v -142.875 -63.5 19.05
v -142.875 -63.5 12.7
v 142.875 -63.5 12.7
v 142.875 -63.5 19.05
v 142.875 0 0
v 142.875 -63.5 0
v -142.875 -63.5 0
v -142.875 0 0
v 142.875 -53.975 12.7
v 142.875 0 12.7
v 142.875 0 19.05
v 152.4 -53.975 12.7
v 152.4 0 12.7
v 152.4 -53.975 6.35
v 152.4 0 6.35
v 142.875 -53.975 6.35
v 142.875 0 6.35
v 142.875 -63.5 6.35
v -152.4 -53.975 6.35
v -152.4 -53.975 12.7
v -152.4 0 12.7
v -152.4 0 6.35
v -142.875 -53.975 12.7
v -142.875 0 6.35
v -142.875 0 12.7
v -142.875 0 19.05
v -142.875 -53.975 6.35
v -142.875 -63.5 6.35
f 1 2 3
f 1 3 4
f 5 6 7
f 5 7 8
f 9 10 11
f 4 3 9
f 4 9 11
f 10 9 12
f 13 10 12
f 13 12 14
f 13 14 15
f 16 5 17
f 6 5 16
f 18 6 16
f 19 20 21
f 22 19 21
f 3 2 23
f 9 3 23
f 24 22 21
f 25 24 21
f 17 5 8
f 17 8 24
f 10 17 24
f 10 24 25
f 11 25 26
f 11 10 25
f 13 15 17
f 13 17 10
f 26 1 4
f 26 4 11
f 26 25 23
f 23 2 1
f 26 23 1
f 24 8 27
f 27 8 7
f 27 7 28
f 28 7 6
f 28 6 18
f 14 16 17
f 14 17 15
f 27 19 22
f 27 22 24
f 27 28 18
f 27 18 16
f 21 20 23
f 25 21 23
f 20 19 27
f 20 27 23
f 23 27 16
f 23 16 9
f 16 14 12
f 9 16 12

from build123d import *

# Parameters (mm, degrees)
F0_W     = 63.5
F0_H     = 19.05
F1_DEPTH = 152.4
F2_W     = 9.525
F2_H     = 6.35
F3_DEPTH = 63.501
F4_W     = 9.525
F4_H     = 6.35
F5_DEPTH = 304.801


with BuildPart() as f1:
    # F0 (on Right) → F1 (new body, symmetric)
    with BuildSketch(Plane.YZ):
        with Locations((-31.75, 9.525)):
            Rectangle(F0_W, F0_H)
    extrude(amount=F1_DEPTH, both=True)

    # F2 (on face) → F3 (cut, through all)
    with BuildSketch(Plane.XZ.offset(63.5)):
        with Locations((147.6375, 15.875)):
            Rectangle(F2_W, F2_H)
        with Locations((147.6375, 3.175)):
            Rectangle(F2_W, F2_H)
        with Locations((-147.6375, 15.875)):
            Rectangle(F2_W, F2_H)
        with Locations((-147.6375, 3.175)):
            Rectangle(F2_W, F2_H)
    extrude(amount=-F3_DEPTH, mode=Mode.SUBTRACT)

    # F4 (on face) → F5 (cut, through all)
    with BuildSketch(Plane.YZ.offset(152.4)):
        with Locations((-58.7375, 9.525)):
            Rectangle(F4_W, F4_H)
    extrude(amount=-F5_DEPTH, mode=Mode.SUBTRACT)


solid = f1.part
